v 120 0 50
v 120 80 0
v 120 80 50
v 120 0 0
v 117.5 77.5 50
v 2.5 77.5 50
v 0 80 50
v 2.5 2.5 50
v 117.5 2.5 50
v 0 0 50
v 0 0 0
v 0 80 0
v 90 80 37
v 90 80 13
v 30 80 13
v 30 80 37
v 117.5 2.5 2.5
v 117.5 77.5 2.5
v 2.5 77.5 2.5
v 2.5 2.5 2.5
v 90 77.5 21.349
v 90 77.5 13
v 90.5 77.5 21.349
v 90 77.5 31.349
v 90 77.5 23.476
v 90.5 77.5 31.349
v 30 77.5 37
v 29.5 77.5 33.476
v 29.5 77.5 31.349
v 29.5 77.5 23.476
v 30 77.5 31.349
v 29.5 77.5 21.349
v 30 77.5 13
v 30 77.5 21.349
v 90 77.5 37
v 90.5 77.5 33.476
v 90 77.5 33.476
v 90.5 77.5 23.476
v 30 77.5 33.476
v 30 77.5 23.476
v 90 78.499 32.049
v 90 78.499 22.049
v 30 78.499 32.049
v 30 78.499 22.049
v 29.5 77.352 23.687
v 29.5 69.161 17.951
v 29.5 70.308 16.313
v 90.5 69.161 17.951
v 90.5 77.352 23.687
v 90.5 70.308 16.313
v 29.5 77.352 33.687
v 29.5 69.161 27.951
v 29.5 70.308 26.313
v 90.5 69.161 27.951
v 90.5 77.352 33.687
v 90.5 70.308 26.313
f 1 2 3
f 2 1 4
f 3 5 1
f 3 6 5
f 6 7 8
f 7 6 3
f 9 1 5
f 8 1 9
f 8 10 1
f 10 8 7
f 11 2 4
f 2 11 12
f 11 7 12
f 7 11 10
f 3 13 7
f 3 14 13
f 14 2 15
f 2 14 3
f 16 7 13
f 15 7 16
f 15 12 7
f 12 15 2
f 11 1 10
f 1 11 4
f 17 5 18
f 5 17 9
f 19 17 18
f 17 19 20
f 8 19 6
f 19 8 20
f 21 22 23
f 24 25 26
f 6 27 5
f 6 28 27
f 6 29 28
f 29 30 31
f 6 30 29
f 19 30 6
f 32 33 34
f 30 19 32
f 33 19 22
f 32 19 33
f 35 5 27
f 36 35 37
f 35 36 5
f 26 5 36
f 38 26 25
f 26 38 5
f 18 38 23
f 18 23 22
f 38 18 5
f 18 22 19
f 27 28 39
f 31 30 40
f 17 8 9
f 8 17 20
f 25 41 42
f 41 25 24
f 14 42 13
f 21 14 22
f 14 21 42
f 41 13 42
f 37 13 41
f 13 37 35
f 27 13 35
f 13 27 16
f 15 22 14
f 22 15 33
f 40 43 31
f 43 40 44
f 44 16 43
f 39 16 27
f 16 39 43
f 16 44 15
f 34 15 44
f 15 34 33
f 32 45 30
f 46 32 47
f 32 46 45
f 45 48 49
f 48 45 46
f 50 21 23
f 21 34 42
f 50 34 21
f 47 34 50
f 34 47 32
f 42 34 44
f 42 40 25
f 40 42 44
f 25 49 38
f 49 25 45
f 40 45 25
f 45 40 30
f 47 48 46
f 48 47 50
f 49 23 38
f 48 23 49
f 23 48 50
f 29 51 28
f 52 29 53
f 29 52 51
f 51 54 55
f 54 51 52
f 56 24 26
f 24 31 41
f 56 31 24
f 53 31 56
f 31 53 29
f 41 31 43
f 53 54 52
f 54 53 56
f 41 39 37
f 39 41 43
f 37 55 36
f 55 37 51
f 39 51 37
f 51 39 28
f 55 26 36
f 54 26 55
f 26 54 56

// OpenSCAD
$fn = 32;

// ----------------------------------------------------------------------
// Vent box: louvers enclosure
// ----------------------------------------------------------------------

// --- parameters (mm) ---
box_l = 120;              // box length, X
box_w = 80;               // box width, Y
box_h = 50;               // box height, Z
wall_t = 2.5;             // shell wall thickness
win_l = 60;               // vent window width, X
win_h = 24;               // vent window height, Z
slat_t = 2;               // louver slat thickness
slat_d = 10;              // louver slat depth
slat_a = 35;              // louver slat angle, degrees
slat_pitch = 10;          // louver pitch
slat_yc = 73.83;          // slat centreline Y

win_z0 = (box_h - win_h) / 2;  // window lower edge Z
n_slats = 2;  // louver count
slat_z0 = win_z0 + (win_h - (n_slats - 1) * slat_pitch) / 2;

difference() {
  union() {
    difference() {
      cube([box_l, box_w, box_h]);
  translate([wall_t, wall_t, wall_t])
    cube([box_l - 2 * wall_t, box_w - 2 * wall_t, box_h]);
  translate([(box_l - win_l) / 2, box_w - wall_t - 1, win_z0])
    cube([win_l, wall_t + 2, win_h]);
    }
    for (i = [0 : n_slats - 1])
      translate([box_l / 2, slat_yc, slat_z0 + i * slat_pitch])
        rotate([slat_a, 0, 0])
          cube([win_l + 1, slat_d, slat_t], center = true);
  }
}
